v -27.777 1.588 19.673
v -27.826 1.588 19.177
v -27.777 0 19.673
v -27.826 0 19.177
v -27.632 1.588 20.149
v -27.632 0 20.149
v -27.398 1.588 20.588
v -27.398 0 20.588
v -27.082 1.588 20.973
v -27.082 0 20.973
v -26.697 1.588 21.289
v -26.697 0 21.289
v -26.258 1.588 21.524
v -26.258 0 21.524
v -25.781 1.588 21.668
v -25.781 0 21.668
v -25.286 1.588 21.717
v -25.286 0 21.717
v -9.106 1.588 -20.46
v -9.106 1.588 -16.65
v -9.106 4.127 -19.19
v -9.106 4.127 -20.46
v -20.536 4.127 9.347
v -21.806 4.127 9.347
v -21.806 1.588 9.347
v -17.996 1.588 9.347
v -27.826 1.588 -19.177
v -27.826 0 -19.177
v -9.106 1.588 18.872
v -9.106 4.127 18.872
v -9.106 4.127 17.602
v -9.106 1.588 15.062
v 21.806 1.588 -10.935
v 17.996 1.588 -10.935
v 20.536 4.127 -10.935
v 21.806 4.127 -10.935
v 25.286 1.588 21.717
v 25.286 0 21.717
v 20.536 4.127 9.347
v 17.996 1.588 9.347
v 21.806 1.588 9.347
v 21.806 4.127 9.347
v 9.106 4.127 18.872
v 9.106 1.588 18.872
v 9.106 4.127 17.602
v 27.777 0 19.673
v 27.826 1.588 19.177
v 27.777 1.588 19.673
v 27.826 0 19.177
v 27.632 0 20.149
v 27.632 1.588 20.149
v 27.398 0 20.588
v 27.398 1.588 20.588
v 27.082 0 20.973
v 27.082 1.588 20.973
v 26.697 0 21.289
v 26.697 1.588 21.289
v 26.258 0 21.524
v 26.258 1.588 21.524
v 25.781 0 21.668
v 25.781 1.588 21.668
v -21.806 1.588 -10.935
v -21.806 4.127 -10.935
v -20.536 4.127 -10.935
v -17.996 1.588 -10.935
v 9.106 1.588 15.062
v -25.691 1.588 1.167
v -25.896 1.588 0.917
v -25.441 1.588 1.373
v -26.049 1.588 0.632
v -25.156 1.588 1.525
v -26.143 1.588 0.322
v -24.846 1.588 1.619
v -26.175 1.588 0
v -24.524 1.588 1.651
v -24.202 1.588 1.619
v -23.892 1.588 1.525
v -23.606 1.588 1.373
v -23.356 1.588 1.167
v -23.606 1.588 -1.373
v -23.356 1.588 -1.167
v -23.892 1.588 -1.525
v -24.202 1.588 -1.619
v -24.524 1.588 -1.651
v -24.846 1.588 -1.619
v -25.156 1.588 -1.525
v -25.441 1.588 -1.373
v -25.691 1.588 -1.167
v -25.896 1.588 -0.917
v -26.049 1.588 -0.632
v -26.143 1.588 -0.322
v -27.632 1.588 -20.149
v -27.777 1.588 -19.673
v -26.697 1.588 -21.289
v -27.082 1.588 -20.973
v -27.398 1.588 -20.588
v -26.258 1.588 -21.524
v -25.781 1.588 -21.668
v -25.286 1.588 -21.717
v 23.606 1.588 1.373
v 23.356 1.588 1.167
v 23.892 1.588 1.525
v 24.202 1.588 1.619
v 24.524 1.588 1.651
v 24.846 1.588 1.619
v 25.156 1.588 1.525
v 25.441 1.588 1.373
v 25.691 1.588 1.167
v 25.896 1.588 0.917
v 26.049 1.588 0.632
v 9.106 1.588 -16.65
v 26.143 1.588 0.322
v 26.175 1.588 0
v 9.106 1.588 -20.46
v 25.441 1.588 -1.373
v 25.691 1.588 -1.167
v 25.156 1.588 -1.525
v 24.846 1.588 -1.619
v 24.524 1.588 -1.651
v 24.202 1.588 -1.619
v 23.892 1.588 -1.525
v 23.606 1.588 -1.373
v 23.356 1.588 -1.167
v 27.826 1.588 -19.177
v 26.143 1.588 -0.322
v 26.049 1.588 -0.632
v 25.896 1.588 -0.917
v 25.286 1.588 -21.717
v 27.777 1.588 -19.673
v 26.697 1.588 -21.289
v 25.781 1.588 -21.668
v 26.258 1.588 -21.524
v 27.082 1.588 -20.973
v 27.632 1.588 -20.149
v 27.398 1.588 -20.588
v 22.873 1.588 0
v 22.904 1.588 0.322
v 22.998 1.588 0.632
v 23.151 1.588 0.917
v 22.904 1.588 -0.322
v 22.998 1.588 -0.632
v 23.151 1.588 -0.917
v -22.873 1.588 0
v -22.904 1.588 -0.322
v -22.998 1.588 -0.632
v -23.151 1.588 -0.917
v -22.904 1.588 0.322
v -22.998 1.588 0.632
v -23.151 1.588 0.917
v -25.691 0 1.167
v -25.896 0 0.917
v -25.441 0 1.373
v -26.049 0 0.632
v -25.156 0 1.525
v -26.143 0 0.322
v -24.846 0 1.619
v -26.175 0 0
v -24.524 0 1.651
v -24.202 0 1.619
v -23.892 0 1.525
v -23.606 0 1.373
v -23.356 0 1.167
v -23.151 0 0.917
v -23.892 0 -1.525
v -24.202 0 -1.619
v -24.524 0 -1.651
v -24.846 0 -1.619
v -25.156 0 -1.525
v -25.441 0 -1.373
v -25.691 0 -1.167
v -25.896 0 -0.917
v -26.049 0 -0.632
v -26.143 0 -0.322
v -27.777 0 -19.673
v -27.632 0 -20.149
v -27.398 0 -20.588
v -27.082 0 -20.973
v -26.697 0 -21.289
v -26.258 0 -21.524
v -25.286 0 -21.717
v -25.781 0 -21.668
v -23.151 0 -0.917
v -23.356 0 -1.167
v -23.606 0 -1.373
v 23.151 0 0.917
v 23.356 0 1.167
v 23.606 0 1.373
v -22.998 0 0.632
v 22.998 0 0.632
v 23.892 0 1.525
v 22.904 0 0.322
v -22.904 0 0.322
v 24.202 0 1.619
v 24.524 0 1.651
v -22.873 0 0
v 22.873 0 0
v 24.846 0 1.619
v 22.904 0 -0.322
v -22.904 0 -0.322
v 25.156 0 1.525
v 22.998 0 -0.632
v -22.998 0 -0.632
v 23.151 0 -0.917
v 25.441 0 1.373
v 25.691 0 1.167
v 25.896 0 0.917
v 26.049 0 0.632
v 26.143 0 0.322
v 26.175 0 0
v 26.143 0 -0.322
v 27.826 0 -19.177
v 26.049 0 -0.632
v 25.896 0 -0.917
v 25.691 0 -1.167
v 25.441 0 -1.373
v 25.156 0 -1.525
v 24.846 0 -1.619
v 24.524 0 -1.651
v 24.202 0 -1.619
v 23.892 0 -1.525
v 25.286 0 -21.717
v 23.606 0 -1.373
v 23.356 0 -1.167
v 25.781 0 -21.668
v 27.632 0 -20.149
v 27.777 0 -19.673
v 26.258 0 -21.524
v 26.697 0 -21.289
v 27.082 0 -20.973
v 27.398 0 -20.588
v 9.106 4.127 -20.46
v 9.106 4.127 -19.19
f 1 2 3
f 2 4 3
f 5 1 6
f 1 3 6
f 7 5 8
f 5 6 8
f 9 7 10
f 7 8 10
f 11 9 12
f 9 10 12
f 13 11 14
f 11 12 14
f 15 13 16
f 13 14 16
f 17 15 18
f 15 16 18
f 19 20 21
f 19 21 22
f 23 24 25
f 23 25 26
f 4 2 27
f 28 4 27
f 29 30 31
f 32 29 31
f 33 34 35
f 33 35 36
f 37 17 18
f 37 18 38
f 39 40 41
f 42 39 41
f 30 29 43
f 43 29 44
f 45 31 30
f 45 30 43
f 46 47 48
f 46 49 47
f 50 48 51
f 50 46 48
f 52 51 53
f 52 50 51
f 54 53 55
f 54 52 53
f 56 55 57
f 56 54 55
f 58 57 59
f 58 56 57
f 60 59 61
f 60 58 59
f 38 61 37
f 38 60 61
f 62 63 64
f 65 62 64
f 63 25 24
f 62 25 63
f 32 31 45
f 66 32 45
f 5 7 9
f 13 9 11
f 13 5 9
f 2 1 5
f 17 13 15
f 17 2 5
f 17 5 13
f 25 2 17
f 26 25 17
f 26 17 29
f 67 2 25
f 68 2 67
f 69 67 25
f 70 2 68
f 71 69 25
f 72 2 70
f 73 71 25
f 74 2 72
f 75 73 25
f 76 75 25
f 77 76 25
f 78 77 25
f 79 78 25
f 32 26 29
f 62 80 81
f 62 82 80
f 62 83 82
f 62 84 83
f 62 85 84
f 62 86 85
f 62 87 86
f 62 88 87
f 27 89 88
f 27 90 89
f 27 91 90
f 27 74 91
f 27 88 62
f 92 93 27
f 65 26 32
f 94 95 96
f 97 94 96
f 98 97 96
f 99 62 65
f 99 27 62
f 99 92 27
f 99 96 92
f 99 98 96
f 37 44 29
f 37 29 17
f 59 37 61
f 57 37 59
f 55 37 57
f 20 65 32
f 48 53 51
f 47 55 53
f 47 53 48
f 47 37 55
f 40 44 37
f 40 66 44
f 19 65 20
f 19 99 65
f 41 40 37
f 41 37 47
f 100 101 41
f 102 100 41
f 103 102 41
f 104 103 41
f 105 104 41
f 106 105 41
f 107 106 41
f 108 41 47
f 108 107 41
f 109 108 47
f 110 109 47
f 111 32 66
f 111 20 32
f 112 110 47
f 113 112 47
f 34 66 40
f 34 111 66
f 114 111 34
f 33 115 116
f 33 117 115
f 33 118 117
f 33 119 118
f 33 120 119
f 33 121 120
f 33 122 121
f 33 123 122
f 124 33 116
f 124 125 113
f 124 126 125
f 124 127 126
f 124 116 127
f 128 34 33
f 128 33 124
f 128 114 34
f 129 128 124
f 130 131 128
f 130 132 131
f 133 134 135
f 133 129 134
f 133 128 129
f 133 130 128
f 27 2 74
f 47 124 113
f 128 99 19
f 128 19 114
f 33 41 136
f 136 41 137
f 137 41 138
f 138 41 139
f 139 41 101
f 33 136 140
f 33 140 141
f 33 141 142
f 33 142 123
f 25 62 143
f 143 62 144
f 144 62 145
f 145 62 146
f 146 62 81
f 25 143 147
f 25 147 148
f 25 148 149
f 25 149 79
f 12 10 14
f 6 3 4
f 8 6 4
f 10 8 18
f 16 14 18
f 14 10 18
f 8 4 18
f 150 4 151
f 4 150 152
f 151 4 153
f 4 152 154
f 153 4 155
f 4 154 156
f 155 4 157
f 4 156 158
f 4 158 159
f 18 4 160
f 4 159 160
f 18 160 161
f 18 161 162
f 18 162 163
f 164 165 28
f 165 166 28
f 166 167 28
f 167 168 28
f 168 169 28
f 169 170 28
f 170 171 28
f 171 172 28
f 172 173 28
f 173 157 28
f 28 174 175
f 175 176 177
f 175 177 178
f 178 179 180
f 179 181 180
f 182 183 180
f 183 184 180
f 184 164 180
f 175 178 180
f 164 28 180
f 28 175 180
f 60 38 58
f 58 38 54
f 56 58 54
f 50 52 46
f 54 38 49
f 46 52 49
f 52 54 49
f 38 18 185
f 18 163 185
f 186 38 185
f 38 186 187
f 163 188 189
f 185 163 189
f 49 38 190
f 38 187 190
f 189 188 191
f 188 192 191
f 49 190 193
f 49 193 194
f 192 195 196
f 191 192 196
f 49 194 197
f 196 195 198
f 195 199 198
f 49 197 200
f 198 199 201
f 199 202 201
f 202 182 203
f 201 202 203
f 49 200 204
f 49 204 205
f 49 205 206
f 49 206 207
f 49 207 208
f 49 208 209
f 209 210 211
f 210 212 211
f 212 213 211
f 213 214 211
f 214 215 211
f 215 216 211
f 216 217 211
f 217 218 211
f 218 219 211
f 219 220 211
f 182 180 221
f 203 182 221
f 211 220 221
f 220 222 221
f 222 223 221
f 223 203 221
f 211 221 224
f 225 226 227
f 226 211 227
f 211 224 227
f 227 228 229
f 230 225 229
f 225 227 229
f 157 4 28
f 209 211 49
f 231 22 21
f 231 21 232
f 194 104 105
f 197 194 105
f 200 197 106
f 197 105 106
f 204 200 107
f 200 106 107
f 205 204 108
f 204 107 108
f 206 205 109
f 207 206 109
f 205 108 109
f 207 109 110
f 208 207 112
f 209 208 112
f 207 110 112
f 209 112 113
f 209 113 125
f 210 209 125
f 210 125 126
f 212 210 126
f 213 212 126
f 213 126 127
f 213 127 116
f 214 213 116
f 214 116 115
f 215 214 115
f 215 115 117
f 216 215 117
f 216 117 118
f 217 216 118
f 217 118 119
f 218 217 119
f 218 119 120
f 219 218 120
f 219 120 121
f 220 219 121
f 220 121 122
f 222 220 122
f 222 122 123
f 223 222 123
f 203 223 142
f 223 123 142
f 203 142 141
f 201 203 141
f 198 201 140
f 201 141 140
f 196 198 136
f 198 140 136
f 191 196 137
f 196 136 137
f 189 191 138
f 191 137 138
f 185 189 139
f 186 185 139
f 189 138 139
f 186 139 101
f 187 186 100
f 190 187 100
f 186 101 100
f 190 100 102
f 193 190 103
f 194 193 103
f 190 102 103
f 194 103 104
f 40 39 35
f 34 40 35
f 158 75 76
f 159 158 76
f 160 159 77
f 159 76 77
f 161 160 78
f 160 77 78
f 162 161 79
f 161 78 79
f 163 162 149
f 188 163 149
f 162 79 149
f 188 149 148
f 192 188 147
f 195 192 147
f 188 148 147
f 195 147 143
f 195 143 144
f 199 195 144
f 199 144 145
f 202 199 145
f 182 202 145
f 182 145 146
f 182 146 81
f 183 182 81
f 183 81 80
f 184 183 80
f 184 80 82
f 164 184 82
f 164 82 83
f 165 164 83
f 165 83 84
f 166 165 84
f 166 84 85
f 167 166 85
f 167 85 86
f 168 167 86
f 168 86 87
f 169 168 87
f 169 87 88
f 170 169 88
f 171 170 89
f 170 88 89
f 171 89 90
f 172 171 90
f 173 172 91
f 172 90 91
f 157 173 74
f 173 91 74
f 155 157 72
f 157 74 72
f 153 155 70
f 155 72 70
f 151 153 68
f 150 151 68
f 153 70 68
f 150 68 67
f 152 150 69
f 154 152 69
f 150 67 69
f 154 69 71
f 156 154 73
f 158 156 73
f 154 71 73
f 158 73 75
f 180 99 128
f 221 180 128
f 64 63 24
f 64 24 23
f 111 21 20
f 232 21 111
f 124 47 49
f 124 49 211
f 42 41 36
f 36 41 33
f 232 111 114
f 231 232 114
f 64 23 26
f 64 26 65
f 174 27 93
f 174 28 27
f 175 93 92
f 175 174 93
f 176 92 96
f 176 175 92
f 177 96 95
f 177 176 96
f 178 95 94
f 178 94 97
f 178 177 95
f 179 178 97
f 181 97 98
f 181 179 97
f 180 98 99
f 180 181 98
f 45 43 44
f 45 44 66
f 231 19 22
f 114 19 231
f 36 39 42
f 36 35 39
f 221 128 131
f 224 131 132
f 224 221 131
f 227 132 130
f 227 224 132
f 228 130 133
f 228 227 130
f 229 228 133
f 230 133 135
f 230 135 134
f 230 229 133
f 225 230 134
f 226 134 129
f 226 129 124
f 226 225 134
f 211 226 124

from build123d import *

# Parameters (mm, degrees)
SKETCH1_W           = 56.6674
SKETCH1_H           = 44.45
BOSS_EXTRUDE1_DEPTH = 1.5875
SKETCH2_W           = 43.6118
SKETCH2_H           = 39.3319
SKETCH2_W_2         = 41.0718
SKETCH2_H_2         = 36.7919
BOSS_EXTRUDE2_DEPTH = 2.54
SKETCH3_R           = 1.651
CUT_EXTRUDE1_DEPTH  = 37.099872308
SKETCH4_W           = 56.6674
SKETCH4_H           = 44.45
SKETCH4_W_2         = 55.6514
SKETCH4_H_2         = 43.434
CUT_EXTRUDE2_DEPTH  = 37.099872308
FILLET1_R           = 2.54
SKETCH5_W           = 12.7
SKETCH5_H           = 9.525
CUT_EXTRUDE3_DEPTH  = 36.388547151
CHAMFER1_SIZE       = 2.54


with BuildPart() as part:
    # Sketch1 → Boss-Extrude1 (new body)
    with BuildSketch(Plane(origin=(0, 0, 0), x_dir=(1, 0, 0), z_dir=(0, 1, 0))):
        Rectangle(SKETCH1_W, SKETCH1_H)
    extrude(amount=BOSS_EXTRUDE1_DEPTH)

    # Sketch2 → Boss-Extrude2 (add)
    with BuildSketch(Plane(origin=(0, 1.5875, 0), x_dir=(1, 0, 0), z_dir=(0, 1, 0))):
        with Locations((0, 0.79375)):
            Rectangle(SKETCH2_W, SKETCH2_H)
        with Locations((0, 0.79375)):
            Rectangle(SKETCH2_W_2, SKETCH2_H_2, mode=Mode.SUBTRACT)
    extrude(amount=BOSS_EXTRUDE2_DEPTH)

    # Sketch3 → Cut-Extrude1 (cut, through all)
    with BuildSketch(Plane(origin=(0, 1.5875, 0), x_dir=(1, 0, 0), z_dir=(0, 1, 0))):
        with Locations(Location((-24.5237, 0, 0), (0, 0, 270))):
            Circle(SKETCH3_R)
        with Locations(Location((24.5237, 0, 0), (0, 0, 270))):
            Circle(SKETCH3_R)
    extrude(amount=-CUT_EXTRUDE1_DEPTH, mode=Mode.SUBTRACT)

    # Sketch4 → Cut-Extrude2 (cut, through all)
    with BuildSketch(Plane(origin=(0, 1.5875, 0), x_dir=(1, 0, 0), z_dir=(0, 1, 0))):
        Rectangle(SKETCH4_W, SKETCH4_H)
        Rectangle(SKETCH4_W_2, SKETCH4_H_2, mode=Mode.SUBTRACT)
    extrude(amount=-CUT_EXTRUDE2_DEPTH, mode=Mode.SUBTRACT)

    # Fillet1
    fillet1_edges = [part.edges().sort_by_distance(p)[0] for p in [
        (27.8257, 0.79375, 21.717),
        (-27.8257, 0.79375, 21.717),
        (-27.8257, 0.79375, -21.717),
        (27.8257, 0.79375, -21.717),
    ]]
    fillet(fillet1_edges, radius=FILLET1_R)

    # Sketch5 → Cut-Extrude3 (cut, through all)
    with BuildSketch(Plane(origin=(0, 1.5875, 0), x_dir=(1, 0, 0), z_dir=(0, 1, 0))):
        with Locations((-15.4559, 15.6972)):
            Rectangle(SKETCH5_W, SKETCH5_H)
        with Locations((-15.4559, -14.1097)):
            Rectangle(SKETCH5_W, SKETCH5_H)
        with Locations((15.4559, -14.1097)):
            Rectangle(SKETCH5_W, SKETCH5_H)
        with Locations((15.4559, 15.6972)):
            Rectangle(SKETCH5_W, SKETCH5_H)
    extrude(amount=CUT_EXTRUDE3_DEPTH, mode=Mode.SUBTRACT)

    # Chamfer1
    chamfer1_edges = [part.edges().sort_by_distance(p)[0] for p in [
        (0, 1.5875, 17.6022),
        (20.5359, 1.5875, -0.79375),
        (0, 1.5875, -19.1897),
        (-20.5359, 1.5875, -0.79375),
    ]]
    chamfer(chamfer1_edges, length=CHAMFER1_SIZE - 0.0001)  # a hair under: the kernel refuses the full size


solid = part.part
